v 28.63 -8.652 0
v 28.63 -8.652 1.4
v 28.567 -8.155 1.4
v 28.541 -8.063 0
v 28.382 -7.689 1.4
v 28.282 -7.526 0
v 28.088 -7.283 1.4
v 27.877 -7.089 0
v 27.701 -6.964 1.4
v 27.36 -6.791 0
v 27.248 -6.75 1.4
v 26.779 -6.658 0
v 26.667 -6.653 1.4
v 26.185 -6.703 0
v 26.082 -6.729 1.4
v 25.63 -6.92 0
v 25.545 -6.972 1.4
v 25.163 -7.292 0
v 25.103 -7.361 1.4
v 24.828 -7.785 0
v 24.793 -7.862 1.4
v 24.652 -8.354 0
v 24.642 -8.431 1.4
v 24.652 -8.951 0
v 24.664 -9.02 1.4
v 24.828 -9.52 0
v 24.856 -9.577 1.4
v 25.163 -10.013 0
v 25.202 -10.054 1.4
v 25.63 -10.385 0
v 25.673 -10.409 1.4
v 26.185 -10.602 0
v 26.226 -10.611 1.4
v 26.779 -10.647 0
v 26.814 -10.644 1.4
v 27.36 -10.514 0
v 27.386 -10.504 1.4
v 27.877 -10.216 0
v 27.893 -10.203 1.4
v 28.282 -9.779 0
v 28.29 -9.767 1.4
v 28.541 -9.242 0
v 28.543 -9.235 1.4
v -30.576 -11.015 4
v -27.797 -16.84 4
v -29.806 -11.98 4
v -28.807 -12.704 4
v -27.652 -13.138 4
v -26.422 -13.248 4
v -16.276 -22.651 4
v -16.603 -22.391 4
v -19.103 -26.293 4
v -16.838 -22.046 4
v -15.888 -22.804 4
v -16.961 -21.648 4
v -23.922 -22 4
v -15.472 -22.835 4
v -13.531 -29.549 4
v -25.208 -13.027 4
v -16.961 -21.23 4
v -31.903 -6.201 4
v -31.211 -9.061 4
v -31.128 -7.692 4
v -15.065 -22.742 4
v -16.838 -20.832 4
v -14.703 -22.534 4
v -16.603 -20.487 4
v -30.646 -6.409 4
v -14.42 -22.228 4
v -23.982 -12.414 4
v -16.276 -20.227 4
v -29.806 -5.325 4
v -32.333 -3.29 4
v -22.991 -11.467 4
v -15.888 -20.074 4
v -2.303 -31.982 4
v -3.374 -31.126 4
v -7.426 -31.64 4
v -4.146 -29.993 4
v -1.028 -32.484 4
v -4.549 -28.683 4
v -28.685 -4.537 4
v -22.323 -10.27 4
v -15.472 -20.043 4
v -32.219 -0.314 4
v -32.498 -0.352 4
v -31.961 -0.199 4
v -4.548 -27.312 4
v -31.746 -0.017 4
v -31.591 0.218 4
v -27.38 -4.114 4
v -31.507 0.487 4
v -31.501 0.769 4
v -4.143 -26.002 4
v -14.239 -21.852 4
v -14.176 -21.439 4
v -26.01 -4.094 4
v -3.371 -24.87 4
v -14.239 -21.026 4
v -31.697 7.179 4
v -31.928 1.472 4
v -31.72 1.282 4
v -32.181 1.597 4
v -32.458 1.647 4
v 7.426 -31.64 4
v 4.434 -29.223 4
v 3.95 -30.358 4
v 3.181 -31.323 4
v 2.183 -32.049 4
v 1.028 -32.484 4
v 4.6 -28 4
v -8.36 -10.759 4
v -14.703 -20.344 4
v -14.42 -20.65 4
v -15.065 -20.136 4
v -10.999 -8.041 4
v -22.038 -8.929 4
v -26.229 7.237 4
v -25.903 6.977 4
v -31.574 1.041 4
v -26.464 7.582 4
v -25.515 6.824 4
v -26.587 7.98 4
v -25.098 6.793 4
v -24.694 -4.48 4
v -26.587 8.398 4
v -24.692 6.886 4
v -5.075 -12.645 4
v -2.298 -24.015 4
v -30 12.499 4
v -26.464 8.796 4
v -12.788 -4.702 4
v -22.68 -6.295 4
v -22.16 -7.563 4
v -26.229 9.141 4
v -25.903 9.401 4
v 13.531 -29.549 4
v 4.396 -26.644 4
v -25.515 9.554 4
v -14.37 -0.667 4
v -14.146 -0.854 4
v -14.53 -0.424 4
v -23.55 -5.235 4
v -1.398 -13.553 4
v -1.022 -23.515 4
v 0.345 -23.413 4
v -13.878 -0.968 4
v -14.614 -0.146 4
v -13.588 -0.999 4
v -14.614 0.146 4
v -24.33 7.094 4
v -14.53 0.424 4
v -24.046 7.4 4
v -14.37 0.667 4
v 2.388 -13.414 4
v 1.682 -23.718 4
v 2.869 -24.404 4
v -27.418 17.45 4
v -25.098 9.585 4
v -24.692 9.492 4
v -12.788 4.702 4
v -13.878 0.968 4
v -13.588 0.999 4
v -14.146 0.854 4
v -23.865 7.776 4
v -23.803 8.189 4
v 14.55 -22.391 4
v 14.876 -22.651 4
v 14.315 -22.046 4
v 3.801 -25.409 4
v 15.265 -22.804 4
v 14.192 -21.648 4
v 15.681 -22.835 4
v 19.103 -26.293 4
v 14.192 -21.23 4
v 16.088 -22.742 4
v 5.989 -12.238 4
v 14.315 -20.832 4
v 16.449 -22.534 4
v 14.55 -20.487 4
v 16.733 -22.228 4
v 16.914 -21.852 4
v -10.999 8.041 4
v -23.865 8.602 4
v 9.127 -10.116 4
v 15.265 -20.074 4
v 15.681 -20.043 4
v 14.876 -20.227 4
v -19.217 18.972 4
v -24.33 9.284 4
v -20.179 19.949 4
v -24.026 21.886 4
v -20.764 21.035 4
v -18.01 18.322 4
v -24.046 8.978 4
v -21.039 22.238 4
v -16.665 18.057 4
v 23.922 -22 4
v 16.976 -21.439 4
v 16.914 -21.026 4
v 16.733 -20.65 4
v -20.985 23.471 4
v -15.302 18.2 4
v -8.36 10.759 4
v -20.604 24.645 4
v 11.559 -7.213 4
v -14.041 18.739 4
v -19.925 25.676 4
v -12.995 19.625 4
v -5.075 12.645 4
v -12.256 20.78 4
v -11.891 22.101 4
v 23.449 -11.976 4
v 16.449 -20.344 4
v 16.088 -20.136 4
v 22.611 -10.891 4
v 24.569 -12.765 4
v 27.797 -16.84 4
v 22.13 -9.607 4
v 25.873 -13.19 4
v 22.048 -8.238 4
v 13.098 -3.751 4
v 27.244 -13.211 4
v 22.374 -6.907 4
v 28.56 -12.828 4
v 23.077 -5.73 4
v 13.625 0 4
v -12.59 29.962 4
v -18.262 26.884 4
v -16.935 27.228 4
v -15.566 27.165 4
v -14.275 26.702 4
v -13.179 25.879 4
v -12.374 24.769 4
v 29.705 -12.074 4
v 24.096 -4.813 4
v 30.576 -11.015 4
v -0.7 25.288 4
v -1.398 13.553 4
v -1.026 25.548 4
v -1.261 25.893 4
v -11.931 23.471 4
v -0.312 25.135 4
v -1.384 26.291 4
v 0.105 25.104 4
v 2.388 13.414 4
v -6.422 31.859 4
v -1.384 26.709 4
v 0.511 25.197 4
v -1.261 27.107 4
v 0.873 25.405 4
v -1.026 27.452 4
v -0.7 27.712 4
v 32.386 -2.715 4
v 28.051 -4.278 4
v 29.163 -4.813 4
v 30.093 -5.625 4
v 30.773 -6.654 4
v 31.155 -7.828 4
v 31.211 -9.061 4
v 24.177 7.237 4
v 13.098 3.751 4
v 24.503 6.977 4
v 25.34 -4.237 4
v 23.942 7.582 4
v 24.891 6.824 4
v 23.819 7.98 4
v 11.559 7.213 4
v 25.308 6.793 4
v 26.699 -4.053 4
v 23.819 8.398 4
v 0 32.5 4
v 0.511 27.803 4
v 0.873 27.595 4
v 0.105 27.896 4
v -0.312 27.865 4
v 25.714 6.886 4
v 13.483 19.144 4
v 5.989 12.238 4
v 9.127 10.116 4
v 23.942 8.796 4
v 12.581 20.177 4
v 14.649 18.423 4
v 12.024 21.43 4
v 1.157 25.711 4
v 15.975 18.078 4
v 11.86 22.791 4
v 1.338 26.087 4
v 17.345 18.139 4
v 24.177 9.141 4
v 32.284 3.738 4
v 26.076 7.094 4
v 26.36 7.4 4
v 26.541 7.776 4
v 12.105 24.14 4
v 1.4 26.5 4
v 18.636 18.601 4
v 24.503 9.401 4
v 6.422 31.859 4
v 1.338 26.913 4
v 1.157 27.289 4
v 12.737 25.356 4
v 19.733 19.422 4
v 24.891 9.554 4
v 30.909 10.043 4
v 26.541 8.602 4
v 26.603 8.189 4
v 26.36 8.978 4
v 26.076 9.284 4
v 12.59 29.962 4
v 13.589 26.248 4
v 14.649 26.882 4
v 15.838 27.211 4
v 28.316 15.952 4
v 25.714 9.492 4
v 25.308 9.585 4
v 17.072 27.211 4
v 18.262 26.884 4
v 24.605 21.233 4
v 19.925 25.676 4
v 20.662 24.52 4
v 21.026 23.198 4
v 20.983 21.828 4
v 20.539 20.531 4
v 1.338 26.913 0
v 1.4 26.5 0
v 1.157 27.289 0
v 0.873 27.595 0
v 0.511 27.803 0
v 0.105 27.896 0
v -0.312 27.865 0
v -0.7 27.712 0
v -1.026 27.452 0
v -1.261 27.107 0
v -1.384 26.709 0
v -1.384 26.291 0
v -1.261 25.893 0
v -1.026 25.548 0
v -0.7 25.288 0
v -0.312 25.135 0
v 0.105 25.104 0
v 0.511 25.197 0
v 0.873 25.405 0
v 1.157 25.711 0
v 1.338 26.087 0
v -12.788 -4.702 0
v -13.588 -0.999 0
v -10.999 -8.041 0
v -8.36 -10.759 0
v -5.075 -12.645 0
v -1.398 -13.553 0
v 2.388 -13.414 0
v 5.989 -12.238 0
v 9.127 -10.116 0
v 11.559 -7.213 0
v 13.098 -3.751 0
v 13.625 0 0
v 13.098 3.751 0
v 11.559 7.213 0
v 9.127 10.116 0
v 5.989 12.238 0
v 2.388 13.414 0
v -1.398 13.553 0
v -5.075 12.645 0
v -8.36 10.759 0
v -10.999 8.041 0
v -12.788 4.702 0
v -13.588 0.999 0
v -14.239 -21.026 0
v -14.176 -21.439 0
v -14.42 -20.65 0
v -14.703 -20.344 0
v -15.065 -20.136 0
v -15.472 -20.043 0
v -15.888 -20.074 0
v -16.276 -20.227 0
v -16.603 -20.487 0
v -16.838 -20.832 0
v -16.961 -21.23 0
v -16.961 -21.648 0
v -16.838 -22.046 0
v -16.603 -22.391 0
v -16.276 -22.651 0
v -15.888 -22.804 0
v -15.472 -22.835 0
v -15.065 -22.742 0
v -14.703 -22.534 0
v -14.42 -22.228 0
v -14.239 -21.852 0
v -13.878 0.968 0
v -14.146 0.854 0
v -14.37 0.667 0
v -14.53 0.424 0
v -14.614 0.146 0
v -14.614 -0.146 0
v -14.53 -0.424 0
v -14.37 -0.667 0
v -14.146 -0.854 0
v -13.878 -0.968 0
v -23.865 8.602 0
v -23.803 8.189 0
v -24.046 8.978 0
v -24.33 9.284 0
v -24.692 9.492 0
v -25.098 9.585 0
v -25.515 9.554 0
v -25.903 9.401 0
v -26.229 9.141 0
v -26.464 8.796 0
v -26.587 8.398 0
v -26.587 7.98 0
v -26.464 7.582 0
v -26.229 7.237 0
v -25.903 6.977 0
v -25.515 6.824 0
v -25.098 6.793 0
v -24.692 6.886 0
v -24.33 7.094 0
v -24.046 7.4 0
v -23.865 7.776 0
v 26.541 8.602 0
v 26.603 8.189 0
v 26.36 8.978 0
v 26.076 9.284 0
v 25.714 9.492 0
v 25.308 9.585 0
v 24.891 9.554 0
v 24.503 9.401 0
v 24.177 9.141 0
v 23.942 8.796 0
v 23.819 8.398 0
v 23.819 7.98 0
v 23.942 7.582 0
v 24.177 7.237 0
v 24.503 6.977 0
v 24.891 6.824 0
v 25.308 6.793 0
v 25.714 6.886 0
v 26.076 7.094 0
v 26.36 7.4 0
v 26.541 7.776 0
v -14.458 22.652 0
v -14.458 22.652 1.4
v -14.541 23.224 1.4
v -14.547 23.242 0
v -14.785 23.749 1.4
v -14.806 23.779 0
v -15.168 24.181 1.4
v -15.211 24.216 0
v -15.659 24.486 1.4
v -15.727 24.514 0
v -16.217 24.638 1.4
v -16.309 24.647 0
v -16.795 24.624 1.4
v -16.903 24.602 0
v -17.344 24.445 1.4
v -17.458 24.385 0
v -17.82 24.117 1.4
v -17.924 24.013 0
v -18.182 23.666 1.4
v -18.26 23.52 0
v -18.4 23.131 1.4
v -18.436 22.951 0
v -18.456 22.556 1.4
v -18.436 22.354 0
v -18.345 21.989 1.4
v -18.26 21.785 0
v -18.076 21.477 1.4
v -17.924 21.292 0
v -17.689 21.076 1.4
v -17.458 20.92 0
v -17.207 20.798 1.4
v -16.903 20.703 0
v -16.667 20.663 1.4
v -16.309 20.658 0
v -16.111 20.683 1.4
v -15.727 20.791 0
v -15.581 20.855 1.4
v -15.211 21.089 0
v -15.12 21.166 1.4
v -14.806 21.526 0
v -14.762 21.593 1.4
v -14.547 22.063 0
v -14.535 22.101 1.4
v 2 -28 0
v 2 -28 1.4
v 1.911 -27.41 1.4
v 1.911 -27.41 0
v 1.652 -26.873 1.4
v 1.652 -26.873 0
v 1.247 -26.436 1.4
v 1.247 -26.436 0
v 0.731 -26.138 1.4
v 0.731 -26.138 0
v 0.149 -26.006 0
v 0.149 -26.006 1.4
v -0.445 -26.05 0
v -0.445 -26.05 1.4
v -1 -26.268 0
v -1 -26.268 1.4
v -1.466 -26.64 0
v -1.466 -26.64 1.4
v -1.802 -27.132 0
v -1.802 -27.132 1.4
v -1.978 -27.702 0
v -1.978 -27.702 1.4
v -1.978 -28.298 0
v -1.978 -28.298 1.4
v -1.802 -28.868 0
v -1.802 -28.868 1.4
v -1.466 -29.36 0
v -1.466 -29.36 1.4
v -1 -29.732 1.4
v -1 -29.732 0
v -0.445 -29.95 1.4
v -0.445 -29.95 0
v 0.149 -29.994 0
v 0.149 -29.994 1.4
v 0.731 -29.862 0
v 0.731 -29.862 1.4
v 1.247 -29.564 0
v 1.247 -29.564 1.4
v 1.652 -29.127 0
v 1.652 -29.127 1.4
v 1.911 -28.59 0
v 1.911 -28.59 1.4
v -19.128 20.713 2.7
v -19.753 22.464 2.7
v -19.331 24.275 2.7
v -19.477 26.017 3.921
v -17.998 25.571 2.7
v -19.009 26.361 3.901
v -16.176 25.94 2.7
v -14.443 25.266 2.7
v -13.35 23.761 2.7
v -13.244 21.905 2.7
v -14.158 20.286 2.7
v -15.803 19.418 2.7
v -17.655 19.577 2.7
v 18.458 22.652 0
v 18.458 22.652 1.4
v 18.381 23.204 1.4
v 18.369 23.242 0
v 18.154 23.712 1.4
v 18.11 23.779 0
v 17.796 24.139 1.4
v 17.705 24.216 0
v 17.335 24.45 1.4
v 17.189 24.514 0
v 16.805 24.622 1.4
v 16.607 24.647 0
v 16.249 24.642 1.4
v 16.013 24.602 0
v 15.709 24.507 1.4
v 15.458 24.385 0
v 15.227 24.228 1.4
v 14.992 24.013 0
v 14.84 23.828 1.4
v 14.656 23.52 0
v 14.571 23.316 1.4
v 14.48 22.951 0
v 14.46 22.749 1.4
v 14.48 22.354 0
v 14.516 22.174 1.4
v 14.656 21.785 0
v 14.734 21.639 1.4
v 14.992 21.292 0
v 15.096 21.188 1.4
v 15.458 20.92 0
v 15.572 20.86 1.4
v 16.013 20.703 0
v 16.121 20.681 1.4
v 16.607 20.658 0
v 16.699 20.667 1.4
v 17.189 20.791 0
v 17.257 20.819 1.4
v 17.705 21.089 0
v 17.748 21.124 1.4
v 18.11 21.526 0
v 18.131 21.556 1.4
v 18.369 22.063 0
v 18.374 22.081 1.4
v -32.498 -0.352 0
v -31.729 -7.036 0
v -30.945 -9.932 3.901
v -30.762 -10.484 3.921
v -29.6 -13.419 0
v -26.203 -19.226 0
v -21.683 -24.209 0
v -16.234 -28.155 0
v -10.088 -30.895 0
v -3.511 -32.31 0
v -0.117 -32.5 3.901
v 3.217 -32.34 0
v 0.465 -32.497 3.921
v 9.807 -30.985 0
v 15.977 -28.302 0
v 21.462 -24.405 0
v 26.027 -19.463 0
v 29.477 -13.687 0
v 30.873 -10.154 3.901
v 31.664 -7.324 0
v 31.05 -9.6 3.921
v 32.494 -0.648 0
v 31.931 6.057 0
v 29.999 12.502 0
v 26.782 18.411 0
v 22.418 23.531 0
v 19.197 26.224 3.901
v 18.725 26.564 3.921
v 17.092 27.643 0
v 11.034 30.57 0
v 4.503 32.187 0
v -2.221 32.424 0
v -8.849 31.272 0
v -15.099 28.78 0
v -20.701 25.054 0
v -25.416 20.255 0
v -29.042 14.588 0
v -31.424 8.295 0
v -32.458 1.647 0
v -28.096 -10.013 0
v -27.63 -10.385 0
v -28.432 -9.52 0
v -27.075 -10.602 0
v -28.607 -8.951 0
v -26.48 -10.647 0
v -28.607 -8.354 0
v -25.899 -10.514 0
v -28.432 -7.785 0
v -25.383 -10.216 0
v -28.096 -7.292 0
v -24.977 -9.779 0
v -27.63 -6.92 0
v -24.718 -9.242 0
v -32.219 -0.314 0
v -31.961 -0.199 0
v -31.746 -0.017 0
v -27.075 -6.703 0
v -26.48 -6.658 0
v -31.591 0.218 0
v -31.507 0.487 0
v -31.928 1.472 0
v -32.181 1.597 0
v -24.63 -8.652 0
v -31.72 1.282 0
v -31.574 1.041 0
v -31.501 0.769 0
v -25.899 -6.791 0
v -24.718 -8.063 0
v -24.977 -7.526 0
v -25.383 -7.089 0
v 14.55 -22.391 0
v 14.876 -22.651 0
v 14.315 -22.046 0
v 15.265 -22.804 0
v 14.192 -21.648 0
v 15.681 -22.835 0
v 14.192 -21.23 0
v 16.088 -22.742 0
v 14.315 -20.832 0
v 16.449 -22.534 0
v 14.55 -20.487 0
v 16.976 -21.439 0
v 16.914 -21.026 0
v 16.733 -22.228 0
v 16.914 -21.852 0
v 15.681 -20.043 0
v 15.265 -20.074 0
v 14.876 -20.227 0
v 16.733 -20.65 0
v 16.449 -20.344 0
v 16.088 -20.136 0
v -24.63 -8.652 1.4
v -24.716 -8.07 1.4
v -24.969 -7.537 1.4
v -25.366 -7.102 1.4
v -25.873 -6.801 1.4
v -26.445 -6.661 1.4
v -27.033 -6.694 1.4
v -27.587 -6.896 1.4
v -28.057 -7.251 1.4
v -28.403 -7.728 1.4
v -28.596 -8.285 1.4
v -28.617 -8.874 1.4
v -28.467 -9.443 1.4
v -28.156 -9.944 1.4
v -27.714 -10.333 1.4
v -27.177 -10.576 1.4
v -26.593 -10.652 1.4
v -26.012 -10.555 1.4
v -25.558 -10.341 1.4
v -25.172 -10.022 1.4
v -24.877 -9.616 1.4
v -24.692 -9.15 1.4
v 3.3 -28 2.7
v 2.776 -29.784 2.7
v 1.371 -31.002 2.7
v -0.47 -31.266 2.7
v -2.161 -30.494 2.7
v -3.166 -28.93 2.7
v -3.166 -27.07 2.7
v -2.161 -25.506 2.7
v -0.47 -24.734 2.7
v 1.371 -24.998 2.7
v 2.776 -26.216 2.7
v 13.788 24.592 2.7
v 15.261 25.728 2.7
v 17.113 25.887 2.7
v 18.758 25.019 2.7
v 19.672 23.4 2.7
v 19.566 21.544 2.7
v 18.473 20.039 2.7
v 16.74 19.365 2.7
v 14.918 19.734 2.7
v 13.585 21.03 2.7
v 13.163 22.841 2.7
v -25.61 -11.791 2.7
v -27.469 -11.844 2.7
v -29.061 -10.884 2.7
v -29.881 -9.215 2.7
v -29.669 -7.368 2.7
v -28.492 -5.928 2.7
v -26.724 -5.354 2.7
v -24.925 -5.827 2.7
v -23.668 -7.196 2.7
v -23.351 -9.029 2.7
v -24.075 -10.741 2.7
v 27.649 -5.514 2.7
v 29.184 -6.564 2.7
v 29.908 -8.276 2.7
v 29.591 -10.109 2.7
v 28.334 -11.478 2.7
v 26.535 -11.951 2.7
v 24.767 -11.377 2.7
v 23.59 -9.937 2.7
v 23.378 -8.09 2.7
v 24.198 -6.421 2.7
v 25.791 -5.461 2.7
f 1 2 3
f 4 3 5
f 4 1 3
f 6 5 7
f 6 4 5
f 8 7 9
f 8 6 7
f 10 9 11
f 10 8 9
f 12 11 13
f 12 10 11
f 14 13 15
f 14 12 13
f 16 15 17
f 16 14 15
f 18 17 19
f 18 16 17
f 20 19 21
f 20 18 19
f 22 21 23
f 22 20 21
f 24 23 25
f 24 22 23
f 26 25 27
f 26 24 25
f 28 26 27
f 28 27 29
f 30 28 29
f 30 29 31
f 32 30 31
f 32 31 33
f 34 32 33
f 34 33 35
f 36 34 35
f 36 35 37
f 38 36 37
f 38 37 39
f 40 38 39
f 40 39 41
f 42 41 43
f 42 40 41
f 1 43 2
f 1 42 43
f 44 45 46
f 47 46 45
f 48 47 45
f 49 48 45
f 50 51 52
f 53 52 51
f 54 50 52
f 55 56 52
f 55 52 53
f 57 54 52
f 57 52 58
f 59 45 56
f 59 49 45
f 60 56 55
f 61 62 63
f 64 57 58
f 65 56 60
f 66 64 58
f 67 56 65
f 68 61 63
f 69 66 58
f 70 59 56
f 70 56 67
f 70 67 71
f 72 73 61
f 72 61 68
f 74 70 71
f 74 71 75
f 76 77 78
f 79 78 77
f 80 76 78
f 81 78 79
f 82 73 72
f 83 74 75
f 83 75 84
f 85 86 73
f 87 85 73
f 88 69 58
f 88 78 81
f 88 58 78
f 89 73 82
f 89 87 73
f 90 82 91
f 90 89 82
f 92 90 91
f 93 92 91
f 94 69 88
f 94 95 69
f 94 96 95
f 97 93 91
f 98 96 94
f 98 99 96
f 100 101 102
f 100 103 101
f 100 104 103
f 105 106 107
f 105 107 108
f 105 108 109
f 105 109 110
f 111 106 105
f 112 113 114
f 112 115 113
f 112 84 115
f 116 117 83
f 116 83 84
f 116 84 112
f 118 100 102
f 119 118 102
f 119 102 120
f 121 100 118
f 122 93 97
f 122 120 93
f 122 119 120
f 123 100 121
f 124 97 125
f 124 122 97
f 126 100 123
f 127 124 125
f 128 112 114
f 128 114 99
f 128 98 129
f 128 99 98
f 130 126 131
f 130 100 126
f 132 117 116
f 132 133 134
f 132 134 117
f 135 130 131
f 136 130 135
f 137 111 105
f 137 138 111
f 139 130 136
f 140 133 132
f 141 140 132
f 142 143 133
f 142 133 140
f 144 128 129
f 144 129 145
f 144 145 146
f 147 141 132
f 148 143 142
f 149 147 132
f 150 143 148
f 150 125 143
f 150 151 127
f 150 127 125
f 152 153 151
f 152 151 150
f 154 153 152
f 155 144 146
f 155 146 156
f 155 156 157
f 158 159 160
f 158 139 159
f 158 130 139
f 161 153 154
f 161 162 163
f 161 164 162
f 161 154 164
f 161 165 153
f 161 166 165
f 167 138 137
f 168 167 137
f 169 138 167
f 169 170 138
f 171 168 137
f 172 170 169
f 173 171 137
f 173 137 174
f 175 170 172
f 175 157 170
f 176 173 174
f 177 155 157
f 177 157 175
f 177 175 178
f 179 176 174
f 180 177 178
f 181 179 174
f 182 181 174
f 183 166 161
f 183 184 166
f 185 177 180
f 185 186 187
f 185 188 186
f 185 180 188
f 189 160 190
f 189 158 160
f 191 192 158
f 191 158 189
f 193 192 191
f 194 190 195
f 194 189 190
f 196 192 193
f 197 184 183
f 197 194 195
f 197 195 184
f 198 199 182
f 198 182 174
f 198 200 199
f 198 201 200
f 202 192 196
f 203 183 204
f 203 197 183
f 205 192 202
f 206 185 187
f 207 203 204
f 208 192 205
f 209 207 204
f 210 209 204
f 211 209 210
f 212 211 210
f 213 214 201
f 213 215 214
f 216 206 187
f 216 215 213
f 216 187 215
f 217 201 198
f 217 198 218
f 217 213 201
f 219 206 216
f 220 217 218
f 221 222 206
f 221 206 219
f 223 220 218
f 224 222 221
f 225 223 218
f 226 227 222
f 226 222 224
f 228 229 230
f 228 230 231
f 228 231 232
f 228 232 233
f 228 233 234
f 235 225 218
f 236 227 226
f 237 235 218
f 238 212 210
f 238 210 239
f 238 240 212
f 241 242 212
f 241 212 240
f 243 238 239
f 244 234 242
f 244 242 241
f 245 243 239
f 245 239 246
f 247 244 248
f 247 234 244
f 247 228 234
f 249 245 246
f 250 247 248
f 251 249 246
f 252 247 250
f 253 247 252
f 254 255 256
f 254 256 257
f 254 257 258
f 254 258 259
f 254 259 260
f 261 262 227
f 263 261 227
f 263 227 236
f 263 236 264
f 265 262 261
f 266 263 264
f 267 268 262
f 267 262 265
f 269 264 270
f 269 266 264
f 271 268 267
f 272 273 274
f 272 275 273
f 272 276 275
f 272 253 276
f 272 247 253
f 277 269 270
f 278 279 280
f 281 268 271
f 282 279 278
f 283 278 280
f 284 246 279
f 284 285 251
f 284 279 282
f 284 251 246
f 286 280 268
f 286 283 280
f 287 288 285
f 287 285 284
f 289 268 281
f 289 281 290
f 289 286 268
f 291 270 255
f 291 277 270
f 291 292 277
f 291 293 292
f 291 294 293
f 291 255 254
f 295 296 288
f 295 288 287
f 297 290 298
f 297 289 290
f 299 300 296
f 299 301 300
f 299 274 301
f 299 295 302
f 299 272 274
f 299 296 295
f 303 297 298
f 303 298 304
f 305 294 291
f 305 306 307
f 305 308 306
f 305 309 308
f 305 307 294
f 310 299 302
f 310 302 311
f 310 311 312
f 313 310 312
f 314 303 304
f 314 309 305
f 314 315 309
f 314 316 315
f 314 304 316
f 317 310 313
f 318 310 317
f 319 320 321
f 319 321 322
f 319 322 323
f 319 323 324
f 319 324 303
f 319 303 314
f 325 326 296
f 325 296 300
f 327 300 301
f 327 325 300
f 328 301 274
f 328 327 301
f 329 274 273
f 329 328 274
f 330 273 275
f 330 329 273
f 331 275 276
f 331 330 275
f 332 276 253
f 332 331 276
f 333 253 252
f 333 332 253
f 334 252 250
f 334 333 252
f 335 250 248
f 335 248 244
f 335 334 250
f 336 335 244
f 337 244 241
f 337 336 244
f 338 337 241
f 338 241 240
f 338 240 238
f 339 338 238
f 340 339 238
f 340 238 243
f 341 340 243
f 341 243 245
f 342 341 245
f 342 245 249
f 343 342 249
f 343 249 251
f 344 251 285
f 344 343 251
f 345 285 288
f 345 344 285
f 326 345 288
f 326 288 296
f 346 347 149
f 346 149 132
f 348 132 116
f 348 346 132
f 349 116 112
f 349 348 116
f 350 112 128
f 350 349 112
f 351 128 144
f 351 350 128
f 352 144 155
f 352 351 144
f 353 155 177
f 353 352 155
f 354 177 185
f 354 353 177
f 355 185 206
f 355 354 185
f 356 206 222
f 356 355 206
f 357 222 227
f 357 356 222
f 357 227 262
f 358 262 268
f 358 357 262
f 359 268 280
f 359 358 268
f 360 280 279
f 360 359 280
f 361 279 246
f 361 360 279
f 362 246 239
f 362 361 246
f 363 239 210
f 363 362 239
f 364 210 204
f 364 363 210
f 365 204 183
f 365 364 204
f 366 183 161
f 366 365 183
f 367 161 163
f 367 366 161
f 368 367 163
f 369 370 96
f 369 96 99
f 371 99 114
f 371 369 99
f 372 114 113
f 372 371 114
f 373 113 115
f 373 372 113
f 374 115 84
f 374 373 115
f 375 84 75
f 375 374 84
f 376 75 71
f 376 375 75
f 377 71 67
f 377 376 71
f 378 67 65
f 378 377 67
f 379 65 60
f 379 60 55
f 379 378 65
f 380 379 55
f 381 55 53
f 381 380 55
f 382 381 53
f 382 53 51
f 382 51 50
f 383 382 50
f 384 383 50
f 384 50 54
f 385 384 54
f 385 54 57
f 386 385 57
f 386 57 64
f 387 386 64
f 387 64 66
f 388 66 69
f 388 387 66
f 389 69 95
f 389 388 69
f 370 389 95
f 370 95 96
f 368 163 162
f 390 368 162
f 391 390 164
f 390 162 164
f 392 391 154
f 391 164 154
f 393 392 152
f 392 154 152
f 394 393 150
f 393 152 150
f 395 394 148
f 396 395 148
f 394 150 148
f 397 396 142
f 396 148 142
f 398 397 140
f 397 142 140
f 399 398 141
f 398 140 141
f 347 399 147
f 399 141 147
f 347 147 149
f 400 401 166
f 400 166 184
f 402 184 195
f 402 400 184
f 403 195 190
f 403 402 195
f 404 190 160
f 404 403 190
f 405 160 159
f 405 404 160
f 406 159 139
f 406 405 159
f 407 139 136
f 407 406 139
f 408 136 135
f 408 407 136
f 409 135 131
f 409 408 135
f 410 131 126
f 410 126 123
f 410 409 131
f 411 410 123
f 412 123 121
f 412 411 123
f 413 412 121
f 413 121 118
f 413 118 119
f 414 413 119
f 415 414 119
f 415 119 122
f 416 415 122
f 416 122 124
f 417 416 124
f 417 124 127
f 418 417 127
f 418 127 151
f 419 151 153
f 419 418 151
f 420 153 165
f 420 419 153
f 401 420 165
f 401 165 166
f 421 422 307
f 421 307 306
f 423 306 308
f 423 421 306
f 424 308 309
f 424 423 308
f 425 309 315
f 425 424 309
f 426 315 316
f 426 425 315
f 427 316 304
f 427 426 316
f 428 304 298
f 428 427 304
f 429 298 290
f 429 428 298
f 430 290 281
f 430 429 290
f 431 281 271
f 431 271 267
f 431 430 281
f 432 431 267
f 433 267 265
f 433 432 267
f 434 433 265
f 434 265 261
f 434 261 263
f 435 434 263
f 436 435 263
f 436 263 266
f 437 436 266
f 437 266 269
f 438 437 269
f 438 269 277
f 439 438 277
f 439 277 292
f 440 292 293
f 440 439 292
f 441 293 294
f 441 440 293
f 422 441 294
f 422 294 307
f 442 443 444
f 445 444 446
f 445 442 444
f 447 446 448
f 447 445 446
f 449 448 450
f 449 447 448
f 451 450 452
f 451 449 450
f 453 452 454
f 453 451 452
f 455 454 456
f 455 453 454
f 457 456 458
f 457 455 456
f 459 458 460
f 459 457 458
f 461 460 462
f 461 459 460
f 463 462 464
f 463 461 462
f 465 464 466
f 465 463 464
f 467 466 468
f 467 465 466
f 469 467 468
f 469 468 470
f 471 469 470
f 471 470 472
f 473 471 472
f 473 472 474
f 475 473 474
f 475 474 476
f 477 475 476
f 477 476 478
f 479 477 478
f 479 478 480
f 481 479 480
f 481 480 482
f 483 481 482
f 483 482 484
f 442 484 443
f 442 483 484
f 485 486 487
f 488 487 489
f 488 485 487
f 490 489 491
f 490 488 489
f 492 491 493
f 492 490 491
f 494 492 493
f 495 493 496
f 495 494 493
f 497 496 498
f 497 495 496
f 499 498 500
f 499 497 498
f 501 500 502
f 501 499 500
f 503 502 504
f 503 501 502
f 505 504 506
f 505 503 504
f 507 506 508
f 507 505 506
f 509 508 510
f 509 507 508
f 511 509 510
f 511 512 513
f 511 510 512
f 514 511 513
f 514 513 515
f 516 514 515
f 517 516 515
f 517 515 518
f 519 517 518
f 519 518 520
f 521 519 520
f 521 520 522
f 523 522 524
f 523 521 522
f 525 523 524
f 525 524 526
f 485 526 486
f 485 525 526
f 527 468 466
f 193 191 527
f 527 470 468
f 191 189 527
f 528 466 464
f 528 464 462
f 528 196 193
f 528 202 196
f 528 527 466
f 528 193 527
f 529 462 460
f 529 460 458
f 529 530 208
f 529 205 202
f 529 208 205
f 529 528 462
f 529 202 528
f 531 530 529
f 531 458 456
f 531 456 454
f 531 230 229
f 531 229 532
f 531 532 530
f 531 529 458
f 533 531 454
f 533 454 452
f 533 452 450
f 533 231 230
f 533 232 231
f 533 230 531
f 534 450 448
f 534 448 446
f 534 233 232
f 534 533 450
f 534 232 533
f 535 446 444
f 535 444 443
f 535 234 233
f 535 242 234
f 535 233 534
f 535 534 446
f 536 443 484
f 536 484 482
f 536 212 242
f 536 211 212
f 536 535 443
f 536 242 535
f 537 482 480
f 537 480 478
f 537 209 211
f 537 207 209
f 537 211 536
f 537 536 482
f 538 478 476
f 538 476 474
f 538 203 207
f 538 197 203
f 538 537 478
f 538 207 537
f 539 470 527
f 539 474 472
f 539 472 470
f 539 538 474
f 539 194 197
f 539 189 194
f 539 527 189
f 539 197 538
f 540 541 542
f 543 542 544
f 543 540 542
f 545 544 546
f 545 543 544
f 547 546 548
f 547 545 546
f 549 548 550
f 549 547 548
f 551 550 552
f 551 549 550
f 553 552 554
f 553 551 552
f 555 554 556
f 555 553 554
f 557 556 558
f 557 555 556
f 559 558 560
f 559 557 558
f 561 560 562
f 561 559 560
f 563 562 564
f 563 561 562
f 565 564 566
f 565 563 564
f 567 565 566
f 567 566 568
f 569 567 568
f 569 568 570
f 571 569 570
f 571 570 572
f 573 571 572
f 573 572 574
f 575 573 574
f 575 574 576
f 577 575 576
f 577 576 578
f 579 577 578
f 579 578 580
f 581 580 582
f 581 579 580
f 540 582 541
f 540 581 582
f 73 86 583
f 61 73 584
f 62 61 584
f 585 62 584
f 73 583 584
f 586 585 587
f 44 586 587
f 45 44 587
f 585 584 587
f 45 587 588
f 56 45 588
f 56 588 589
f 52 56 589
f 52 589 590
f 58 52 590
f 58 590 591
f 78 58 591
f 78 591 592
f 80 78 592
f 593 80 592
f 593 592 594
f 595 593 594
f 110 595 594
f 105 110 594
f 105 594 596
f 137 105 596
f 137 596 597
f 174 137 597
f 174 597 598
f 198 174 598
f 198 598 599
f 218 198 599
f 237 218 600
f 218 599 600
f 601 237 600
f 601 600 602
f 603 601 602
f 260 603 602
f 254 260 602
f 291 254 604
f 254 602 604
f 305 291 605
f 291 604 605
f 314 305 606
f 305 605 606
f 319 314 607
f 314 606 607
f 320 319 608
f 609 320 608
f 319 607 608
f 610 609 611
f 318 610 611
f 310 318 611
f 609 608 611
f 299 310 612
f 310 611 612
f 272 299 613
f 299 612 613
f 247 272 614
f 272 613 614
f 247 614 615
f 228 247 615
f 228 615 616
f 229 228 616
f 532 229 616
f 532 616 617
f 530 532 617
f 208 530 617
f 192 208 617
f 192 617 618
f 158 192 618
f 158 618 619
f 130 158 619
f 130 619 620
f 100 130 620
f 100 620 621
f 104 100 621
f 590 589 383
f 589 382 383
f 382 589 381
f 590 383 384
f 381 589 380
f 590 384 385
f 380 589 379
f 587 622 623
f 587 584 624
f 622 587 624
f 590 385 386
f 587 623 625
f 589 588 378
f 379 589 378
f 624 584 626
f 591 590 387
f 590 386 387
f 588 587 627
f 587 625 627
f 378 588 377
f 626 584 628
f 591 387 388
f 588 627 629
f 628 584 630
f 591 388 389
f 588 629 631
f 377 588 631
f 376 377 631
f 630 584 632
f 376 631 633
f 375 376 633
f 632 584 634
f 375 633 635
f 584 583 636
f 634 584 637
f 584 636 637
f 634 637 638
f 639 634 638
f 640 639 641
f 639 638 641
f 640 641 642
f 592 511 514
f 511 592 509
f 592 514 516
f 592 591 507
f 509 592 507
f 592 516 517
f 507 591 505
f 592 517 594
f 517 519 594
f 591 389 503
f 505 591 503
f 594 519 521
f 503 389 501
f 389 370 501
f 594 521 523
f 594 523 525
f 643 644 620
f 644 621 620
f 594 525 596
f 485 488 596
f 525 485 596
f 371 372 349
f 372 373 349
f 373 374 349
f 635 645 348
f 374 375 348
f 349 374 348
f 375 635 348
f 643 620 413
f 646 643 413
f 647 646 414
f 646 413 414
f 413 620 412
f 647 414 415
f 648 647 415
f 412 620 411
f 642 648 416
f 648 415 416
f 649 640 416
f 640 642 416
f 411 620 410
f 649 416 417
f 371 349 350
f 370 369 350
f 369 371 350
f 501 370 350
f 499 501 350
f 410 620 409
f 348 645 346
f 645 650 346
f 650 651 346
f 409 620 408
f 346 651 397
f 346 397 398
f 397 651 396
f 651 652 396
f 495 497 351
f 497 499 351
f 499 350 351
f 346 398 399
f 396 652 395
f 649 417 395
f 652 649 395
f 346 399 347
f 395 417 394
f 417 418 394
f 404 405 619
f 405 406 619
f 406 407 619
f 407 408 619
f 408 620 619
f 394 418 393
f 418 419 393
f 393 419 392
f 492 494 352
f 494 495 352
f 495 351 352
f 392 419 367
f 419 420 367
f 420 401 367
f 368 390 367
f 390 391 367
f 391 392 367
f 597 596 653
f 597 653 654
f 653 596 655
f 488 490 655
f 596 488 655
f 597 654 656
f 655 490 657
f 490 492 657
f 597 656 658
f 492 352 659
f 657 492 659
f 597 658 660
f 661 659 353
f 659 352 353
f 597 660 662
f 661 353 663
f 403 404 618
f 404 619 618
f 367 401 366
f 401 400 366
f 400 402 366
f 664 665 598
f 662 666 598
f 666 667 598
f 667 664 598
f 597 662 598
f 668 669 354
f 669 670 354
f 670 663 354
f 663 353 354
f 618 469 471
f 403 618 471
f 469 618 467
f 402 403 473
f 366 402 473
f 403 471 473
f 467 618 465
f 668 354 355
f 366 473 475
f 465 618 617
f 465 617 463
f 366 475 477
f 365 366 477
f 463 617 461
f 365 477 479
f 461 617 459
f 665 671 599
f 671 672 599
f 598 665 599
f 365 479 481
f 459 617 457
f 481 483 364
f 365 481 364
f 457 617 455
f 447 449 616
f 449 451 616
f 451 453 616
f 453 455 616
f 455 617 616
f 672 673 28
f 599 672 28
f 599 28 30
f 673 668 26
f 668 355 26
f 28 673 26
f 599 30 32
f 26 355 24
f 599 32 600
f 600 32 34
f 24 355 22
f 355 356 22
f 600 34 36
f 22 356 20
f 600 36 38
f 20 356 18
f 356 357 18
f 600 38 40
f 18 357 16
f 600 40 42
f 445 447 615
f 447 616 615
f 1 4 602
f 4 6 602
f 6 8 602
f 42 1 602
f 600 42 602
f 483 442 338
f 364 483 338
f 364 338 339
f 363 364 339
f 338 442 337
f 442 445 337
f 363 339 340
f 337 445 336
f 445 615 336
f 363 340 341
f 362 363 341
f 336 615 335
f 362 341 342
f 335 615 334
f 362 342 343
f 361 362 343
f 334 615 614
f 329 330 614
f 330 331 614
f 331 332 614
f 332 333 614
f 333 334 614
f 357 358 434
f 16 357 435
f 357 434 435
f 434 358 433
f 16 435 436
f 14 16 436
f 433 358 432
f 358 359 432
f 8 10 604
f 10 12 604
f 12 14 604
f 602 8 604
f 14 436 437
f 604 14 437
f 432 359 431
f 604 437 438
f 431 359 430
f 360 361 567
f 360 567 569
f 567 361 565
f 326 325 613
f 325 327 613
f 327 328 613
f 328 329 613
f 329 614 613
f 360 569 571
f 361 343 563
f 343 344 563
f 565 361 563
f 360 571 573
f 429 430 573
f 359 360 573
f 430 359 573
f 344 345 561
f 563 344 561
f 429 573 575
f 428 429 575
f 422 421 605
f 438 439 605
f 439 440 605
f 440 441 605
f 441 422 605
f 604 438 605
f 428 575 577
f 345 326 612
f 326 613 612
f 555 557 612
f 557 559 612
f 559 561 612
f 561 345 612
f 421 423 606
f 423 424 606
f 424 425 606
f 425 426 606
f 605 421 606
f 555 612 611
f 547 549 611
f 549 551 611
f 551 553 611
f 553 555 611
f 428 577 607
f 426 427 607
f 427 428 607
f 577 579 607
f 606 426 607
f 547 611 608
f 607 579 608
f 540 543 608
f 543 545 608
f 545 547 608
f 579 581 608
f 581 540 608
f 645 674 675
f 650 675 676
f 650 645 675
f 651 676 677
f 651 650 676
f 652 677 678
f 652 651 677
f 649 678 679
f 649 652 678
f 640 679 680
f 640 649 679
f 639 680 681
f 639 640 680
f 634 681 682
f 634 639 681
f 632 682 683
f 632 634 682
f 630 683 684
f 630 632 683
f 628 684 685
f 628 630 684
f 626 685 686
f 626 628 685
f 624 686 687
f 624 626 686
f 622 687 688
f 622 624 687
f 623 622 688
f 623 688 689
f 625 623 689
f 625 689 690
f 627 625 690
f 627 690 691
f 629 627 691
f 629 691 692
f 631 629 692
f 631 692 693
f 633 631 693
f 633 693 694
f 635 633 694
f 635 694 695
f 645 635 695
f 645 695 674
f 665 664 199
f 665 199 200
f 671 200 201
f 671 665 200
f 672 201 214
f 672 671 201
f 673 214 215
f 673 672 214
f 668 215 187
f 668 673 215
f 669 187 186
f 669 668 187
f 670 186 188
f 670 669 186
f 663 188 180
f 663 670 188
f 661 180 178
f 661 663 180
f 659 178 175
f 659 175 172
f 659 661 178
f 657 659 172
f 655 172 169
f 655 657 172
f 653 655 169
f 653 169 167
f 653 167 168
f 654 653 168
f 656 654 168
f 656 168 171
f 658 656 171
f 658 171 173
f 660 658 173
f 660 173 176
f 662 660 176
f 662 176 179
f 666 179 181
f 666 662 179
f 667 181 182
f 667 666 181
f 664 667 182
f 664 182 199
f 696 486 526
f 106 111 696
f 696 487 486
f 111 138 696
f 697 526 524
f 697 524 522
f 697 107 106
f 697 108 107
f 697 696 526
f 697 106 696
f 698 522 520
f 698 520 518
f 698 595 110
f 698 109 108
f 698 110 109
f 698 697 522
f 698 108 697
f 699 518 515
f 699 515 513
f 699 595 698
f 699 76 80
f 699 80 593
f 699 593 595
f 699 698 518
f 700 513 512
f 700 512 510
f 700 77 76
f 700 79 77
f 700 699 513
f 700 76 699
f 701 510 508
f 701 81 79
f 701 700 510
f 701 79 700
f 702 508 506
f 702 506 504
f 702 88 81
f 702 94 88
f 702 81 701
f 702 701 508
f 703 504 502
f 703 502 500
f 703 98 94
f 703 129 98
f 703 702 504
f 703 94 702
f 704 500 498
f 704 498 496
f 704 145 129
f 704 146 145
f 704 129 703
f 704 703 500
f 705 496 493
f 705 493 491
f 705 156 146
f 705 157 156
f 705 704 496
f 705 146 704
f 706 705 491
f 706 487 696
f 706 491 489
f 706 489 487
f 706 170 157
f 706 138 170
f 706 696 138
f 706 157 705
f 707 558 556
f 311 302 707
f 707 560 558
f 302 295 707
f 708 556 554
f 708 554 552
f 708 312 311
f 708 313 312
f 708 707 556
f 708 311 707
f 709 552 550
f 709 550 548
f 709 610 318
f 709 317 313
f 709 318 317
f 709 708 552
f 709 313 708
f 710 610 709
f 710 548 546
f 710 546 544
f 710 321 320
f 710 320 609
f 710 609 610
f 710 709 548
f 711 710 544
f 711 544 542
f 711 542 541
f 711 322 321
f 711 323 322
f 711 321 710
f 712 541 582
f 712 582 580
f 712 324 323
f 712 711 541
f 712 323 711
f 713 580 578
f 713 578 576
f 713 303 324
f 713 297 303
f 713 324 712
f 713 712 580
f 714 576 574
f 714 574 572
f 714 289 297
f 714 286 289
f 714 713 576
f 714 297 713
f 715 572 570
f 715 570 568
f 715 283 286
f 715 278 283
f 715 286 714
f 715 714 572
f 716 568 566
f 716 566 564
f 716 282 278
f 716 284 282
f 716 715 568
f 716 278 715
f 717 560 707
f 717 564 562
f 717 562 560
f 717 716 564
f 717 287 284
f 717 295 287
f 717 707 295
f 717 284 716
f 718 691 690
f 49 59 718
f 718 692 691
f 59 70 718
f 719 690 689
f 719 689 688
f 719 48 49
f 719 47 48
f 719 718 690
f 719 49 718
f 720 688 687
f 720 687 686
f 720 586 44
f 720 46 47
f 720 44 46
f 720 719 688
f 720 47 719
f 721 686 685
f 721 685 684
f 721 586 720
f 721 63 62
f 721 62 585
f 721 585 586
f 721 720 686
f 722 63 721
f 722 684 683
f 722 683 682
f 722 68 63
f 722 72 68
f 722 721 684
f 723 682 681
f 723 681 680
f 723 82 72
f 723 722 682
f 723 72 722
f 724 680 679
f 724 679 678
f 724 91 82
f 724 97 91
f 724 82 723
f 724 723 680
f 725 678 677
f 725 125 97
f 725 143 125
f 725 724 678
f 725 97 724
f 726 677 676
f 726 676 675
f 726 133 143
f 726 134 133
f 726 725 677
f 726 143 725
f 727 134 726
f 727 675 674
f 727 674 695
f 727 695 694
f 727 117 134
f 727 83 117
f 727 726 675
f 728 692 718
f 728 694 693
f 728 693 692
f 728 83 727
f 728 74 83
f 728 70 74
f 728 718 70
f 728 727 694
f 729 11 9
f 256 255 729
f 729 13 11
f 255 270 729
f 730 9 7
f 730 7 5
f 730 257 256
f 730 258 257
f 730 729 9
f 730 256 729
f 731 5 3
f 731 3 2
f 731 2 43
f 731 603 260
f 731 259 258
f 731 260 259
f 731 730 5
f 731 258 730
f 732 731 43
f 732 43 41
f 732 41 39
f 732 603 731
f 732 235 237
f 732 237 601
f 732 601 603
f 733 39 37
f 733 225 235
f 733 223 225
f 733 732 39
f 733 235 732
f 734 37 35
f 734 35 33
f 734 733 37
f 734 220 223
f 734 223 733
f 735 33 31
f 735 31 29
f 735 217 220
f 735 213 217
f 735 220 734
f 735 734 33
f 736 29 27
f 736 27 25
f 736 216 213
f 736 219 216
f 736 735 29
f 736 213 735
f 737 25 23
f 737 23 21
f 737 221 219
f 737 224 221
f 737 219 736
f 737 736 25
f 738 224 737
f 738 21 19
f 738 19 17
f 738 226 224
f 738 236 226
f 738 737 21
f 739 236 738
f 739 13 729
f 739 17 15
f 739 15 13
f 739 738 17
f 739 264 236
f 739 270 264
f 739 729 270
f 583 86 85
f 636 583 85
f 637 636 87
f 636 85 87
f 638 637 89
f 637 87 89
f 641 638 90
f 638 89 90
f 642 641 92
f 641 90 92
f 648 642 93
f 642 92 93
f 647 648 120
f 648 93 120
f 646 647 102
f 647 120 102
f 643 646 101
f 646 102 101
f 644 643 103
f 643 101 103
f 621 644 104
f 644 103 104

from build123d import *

# Parameters (mm, degrees)
SKETCH_1_R               = 32.5
SKETCH_1_R_2             = 13.625
SKETCH_1_R_3             = 2
SKETCH_1_R_4             = 1.4
EXTRUDE_1_DEPTH          = 4
SKETCH_2_R               = 1
CUT_EXTRUDE_1_DEPTH      = 10
PATTERN_CIRCULAR_1_COUNT = 5


with BuildPart() as part:
    # 草图1 → 凸台-拉伸1 (new body)
    with BuildSketch(Plane.XY):
        Circle(SKETCH_1_R)
        Circle(SKETCH_1_R_2, mode=Mode.SUBTRACT)
        with Locations((0, -28)):
            Circle(SKETCH_1_R_3, mode=Mode.SUBTRACT)
        with Locations((-26.629582456, -8.652475842)):
            Circle(SKETCH_1_R_3, mode=Mode.SUBTRACT)
        with Locations((-16.457987064, 22.652475842)):
            Circle(SKETCH_1_R_3, mode=Mode.SUBTRACT)
        with Locations((16.457987064, 22.652475842)):
            Circle(SKETCH_1_R_3, mode=Mode.SUBTRACT)
        with Locations((26.629582456, -8.652475842)):
            Circle(SKETCH_1_R_3, mode=Mode.SUBTRACT)
        with Locations((-15.576309186, -21.438950351)):
            Circle(SKETCH_1_R_4, mode=Mode.SUBTRACT)
        with Locations((-25.202997682, 8.188950351)):
            Circle(SKETCH_1_R_4, mode=Mode.SUBTRACT)
        with Locations((0, 26.5)):
            Circle(SKETCH_1_R_4, mode=Mode.SUBTRACT)
        with Locations((25.202997682, 8.188950351)):
            Circle(SKETCH_1_R_4, mode=Mode.SUBTRACT)
        with Locations((15.576309186, -21.438950351)):
            Circle(SKETCH_1_R_4, mode=Mode.SUBTRACT)
    extrude(amount=EXTRUDE_1_DEPTH)

    # 草图2 → 切除-拉伸1 (cut)
    with BuildSketch(Plane.XY.offset(4)):
        with Locations((-13.625, 0)):
            Circle(SKETCH_2_R)
        with Locations((-32.49354651, 0.647638152)):
            Circle(SKETCH_2_R)
    extrude(amount=-CUT_EXTRUDE_1_DEPTH, mode=Mode.SUBTRACT)

    # 草图5 → 切除-旋转2 (revolve, cut)
    with BuildSketch(Plane(origin=(0, 0, 0), x_dir=(0, 0, -1), z_dir=(1, 0, 0)), mode=Mode.PRIVATE) as cut_revolve_2_sk:
        Polygon((-4, -28), (-1.4, -28), (-1.4, -30), (-4, -32.6), align=None)
    cut_revolve_2 = revolve(cut_revolve_2_sk.sketch.rotate(Axis((0, -28, 4), (0, 0, -1)), 270), axis=Axis((0, -28, 4), (0, 0, -1)), mode=Mode.SUBTRACT)

    # 阵列(圆周)1: 切除-旋转2 ×5 about axis
    pattern_circular_1_axis = Axis((0, 0, 0), (0, 0, 1))
    for i in range(1, PATTERN_CIRCULAR_1_COUNT):
        add(cut_revolve_2.rotate(pattern_circular_1_axis, i * 360 / PATTERN_CIRCULAR_1_COUNT), mode=Mode.SUBTRACT)


solid = part.part
